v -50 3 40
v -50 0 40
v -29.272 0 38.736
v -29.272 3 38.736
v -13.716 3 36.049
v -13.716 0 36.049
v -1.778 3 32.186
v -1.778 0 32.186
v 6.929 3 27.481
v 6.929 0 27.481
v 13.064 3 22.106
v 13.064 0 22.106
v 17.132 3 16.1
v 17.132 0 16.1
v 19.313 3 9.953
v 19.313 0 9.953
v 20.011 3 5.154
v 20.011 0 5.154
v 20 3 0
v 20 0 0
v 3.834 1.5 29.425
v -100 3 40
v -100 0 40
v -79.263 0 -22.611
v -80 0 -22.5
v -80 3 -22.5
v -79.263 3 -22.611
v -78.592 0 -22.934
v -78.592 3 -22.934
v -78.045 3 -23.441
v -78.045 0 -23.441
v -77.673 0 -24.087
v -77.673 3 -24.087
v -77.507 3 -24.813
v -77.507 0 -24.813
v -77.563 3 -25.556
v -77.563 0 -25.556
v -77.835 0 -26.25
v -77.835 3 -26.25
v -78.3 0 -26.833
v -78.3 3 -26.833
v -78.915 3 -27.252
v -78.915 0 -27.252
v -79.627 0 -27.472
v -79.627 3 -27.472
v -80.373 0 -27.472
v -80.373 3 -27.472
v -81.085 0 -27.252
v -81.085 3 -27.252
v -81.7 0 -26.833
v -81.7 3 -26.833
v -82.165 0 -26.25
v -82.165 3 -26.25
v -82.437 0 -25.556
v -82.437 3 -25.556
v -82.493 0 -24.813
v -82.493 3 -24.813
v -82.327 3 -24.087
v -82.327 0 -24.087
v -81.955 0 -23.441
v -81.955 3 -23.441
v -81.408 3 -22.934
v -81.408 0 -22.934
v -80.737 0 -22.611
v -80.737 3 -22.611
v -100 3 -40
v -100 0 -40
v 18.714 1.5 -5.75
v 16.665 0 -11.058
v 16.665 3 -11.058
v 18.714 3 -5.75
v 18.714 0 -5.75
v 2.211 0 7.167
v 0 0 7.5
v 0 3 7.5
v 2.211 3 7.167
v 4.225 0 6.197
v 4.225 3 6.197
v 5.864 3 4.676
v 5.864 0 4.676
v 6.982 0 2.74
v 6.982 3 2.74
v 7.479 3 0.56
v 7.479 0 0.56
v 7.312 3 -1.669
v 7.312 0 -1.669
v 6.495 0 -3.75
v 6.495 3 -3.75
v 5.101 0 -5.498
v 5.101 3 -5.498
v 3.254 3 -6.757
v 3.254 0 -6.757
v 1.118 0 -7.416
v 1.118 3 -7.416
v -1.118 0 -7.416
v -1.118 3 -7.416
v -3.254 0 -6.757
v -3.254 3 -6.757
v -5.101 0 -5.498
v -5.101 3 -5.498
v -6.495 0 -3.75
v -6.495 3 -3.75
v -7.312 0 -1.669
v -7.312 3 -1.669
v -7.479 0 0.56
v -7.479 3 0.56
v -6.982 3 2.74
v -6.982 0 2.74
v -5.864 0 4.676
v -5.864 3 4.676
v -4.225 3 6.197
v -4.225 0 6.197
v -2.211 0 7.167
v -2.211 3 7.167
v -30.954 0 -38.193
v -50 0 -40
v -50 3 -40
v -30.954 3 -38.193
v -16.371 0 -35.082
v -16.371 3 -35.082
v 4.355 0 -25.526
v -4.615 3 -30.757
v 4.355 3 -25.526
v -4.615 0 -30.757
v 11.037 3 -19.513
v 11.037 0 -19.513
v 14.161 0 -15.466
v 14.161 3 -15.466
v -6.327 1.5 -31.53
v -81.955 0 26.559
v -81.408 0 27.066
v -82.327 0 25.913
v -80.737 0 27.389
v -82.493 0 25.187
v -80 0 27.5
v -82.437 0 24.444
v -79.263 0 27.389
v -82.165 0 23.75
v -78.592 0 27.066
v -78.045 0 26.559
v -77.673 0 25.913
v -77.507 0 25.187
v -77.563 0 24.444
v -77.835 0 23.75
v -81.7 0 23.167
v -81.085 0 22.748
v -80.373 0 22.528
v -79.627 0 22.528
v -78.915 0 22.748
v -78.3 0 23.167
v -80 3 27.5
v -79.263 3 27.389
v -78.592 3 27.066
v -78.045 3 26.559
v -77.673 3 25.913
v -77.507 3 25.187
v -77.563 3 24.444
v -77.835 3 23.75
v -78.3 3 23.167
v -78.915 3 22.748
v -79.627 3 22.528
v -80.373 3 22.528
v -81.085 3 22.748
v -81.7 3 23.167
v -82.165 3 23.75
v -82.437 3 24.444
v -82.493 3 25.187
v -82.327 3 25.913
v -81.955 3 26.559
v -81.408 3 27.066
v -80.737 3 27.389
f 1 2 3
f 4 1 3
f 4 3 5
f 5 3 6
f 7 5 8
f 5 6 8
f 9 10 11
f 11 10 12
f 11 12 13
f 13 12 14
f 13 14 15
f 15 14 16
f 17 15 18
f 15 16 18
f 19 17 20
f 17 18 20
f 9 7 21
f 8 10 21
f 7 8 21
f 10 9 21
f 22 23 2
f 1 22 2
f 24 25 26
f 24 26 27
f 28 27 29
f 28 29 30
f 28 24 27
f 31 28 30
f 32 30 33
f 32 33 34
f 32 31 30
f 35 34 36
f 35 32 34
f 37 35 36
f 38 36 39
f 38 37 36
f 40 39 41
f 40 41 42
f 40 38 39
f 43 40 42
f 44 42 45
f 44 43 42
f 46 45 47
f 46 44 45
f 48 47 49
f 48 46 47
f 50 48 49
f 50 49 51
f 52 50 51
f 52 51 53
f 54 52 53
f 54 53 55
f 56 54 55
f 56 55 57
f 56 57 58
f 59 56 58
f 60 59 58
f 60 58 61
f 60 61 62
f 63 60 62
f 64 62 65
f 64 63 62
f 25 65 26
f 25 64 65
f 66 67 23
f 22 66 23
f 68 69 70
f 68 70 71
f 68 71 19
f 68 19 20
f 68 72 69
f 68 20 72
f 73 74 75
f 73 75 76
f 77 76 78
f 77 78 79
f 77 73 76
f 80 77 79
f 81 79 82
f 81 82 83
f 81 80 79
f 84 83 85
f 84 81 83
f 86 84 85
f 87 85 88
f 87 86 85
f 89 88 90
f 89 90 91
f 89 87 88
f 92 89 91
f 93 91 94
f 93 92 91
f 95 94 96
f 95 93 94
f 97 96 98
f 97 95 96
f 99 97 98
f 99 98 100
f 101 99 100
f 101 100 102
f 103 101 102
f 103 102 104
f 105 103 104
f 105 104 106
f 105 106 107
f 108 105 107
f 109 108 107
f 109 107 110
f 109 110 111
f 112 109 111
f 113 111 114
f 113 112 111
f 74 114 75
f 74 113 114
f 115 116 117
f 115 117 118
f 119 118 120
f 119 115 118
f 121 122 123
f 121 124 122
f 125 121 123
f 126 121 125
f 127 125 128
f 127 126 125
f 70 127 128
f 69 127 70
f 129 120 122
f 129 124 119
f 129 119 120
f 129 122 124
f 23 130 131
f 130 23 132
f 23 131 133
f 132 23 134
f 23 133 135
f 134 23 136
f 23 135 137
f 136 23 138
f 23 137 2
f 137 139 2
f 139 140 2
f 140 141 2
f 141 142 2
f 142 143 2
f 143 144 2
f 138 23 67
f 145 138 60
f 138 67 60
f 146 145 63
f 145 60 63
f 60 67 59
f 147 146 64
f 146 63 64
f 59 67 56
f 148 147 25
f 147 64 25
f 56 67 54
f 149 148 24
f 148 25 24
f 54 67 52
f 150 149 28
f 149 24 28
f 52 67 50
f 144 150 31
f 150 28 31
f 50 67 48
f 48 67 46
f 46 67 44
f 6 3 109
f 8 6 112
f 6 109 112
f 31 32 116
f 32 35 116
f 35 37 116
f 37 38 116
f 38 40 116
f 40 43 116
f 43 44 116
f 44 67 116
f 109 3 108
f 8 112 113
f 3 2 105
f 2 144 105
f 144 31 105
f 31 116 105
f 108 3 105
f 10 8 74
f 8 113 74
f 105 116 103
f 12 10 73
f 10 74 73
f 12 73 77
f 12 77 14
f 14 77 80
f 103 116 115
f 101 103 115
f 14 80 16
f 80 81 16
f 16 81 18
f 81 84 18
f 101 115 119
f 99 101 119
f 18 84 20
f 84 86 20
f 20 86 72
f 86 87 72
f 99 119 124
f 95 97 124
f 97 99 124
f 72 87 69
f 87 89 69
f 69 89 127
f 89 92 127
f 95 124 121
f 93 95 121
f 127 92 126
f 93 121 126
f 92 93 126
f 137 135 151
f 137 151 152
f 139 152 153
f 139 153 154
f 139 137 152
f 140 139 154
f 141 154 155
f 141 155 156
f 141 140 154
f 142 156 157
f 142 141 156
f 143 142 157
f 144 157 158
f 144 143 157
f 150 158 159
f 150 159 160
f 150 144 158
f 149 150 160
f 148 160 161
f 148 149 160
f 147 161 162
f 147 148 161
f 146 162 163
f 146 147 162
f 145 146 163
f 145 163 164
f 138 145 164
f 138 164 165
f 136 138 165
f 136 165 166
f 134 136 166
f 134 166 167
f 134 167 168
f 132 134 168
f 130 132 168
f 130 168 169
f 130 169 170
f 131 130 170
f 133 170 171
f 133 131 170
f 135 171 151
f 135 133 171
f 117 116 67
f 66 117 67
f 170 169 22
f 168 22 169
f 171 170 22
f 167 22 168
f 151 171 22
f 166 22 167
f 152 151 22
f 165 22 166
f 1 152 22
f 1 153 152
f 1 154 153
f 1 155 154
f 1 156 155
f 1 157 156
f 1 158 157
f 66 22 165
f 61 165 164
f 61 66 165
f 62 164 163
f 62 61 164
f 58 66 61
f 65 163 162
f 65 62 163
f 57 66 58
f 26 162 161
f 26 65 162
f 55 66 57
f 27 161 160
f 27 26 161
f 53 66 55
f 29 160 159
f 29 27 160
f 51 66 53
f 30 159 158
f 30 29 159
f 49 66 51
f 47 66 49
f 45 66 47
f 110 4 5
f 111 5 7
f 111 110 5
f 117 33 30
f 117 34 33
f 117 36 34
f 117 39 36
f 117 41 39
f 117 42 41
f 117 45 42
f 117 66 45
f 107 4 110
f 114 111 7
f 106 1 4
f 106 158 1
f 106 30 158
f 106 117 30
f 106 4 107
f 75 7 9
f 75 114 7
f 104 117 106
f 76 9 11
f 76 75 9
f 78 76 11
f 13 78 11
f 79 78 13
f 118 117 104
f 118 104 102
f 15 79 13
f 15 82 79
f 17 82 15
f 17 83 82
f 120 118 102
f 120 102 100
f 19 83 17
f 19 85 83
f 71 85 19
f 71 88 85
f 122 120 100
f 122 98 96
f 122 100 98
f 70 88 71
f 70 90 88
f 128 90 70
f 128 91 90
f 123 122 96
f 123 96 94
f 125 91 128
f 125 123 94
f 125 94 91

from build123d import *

# Parameters (mm, degrees)
SKETCH1_R           = 2.5
SKETCH1_R_2         = 7.5
BOSS_EXTRUDE1_DEPTH = 3


with BuildPart() as part:
    # Sketch1 → Boss-Extrude1 (new body)
    with BuildSketch(Plane(origin=(0, 0, 0), x_dir=(1, 0, 0), z_dir=(0, 1, 0))):
        with BuildLine():
            Line((-100, 40), (-100, -40))
            Line((-100, -40), (-50, -40))
            add(Edge.make_bspline(
                [(-50, -40), (22.668262508, -38.849155335), (20, 0)],
                knots=[0, 0, 0, 0.942307838, 0.942307838, 0.942307838], degree=2))
            add(Edge.make_bspline(
                [(16.665092834, 11.057788243), (19.095873291, 5.971869908), (20, 0)],
                knots=[0.704383091, 0.704383091, 0.704383091, 0.839710595, 0.839710595, 0.839710595], degree=2))
            add(Edge.make_bspline(
                [(-50, 40), (4.01281886, 37.53012226), (16.665092834, 11.057788243)],
                knots=[0, 0, 0, 0.704383091, 0.704383091, 0.704383091], degree=2))
            Line((-50, 40), (-100, 40))
        make_face()
        with Locations(Location((-80, -25, 0), (0, 0, 270))):
            Circle(SKETCH1_R, mode=Mode.SUBTRACT)
        with Locations(Location((-80, 25, 0), (0, 0, 270))):
            Circle(SKETCH1_R, mode=Mode.SUBTRACT)
        with Locations(Location((0, 0, 0), (0, 0, 270))):
            Circle(SKETCH1_R_2, mode=Mode.SUBTRACT)
    extrude(amount=BOSS_EXTRUDE1_DEPTH)


solid = part.part
